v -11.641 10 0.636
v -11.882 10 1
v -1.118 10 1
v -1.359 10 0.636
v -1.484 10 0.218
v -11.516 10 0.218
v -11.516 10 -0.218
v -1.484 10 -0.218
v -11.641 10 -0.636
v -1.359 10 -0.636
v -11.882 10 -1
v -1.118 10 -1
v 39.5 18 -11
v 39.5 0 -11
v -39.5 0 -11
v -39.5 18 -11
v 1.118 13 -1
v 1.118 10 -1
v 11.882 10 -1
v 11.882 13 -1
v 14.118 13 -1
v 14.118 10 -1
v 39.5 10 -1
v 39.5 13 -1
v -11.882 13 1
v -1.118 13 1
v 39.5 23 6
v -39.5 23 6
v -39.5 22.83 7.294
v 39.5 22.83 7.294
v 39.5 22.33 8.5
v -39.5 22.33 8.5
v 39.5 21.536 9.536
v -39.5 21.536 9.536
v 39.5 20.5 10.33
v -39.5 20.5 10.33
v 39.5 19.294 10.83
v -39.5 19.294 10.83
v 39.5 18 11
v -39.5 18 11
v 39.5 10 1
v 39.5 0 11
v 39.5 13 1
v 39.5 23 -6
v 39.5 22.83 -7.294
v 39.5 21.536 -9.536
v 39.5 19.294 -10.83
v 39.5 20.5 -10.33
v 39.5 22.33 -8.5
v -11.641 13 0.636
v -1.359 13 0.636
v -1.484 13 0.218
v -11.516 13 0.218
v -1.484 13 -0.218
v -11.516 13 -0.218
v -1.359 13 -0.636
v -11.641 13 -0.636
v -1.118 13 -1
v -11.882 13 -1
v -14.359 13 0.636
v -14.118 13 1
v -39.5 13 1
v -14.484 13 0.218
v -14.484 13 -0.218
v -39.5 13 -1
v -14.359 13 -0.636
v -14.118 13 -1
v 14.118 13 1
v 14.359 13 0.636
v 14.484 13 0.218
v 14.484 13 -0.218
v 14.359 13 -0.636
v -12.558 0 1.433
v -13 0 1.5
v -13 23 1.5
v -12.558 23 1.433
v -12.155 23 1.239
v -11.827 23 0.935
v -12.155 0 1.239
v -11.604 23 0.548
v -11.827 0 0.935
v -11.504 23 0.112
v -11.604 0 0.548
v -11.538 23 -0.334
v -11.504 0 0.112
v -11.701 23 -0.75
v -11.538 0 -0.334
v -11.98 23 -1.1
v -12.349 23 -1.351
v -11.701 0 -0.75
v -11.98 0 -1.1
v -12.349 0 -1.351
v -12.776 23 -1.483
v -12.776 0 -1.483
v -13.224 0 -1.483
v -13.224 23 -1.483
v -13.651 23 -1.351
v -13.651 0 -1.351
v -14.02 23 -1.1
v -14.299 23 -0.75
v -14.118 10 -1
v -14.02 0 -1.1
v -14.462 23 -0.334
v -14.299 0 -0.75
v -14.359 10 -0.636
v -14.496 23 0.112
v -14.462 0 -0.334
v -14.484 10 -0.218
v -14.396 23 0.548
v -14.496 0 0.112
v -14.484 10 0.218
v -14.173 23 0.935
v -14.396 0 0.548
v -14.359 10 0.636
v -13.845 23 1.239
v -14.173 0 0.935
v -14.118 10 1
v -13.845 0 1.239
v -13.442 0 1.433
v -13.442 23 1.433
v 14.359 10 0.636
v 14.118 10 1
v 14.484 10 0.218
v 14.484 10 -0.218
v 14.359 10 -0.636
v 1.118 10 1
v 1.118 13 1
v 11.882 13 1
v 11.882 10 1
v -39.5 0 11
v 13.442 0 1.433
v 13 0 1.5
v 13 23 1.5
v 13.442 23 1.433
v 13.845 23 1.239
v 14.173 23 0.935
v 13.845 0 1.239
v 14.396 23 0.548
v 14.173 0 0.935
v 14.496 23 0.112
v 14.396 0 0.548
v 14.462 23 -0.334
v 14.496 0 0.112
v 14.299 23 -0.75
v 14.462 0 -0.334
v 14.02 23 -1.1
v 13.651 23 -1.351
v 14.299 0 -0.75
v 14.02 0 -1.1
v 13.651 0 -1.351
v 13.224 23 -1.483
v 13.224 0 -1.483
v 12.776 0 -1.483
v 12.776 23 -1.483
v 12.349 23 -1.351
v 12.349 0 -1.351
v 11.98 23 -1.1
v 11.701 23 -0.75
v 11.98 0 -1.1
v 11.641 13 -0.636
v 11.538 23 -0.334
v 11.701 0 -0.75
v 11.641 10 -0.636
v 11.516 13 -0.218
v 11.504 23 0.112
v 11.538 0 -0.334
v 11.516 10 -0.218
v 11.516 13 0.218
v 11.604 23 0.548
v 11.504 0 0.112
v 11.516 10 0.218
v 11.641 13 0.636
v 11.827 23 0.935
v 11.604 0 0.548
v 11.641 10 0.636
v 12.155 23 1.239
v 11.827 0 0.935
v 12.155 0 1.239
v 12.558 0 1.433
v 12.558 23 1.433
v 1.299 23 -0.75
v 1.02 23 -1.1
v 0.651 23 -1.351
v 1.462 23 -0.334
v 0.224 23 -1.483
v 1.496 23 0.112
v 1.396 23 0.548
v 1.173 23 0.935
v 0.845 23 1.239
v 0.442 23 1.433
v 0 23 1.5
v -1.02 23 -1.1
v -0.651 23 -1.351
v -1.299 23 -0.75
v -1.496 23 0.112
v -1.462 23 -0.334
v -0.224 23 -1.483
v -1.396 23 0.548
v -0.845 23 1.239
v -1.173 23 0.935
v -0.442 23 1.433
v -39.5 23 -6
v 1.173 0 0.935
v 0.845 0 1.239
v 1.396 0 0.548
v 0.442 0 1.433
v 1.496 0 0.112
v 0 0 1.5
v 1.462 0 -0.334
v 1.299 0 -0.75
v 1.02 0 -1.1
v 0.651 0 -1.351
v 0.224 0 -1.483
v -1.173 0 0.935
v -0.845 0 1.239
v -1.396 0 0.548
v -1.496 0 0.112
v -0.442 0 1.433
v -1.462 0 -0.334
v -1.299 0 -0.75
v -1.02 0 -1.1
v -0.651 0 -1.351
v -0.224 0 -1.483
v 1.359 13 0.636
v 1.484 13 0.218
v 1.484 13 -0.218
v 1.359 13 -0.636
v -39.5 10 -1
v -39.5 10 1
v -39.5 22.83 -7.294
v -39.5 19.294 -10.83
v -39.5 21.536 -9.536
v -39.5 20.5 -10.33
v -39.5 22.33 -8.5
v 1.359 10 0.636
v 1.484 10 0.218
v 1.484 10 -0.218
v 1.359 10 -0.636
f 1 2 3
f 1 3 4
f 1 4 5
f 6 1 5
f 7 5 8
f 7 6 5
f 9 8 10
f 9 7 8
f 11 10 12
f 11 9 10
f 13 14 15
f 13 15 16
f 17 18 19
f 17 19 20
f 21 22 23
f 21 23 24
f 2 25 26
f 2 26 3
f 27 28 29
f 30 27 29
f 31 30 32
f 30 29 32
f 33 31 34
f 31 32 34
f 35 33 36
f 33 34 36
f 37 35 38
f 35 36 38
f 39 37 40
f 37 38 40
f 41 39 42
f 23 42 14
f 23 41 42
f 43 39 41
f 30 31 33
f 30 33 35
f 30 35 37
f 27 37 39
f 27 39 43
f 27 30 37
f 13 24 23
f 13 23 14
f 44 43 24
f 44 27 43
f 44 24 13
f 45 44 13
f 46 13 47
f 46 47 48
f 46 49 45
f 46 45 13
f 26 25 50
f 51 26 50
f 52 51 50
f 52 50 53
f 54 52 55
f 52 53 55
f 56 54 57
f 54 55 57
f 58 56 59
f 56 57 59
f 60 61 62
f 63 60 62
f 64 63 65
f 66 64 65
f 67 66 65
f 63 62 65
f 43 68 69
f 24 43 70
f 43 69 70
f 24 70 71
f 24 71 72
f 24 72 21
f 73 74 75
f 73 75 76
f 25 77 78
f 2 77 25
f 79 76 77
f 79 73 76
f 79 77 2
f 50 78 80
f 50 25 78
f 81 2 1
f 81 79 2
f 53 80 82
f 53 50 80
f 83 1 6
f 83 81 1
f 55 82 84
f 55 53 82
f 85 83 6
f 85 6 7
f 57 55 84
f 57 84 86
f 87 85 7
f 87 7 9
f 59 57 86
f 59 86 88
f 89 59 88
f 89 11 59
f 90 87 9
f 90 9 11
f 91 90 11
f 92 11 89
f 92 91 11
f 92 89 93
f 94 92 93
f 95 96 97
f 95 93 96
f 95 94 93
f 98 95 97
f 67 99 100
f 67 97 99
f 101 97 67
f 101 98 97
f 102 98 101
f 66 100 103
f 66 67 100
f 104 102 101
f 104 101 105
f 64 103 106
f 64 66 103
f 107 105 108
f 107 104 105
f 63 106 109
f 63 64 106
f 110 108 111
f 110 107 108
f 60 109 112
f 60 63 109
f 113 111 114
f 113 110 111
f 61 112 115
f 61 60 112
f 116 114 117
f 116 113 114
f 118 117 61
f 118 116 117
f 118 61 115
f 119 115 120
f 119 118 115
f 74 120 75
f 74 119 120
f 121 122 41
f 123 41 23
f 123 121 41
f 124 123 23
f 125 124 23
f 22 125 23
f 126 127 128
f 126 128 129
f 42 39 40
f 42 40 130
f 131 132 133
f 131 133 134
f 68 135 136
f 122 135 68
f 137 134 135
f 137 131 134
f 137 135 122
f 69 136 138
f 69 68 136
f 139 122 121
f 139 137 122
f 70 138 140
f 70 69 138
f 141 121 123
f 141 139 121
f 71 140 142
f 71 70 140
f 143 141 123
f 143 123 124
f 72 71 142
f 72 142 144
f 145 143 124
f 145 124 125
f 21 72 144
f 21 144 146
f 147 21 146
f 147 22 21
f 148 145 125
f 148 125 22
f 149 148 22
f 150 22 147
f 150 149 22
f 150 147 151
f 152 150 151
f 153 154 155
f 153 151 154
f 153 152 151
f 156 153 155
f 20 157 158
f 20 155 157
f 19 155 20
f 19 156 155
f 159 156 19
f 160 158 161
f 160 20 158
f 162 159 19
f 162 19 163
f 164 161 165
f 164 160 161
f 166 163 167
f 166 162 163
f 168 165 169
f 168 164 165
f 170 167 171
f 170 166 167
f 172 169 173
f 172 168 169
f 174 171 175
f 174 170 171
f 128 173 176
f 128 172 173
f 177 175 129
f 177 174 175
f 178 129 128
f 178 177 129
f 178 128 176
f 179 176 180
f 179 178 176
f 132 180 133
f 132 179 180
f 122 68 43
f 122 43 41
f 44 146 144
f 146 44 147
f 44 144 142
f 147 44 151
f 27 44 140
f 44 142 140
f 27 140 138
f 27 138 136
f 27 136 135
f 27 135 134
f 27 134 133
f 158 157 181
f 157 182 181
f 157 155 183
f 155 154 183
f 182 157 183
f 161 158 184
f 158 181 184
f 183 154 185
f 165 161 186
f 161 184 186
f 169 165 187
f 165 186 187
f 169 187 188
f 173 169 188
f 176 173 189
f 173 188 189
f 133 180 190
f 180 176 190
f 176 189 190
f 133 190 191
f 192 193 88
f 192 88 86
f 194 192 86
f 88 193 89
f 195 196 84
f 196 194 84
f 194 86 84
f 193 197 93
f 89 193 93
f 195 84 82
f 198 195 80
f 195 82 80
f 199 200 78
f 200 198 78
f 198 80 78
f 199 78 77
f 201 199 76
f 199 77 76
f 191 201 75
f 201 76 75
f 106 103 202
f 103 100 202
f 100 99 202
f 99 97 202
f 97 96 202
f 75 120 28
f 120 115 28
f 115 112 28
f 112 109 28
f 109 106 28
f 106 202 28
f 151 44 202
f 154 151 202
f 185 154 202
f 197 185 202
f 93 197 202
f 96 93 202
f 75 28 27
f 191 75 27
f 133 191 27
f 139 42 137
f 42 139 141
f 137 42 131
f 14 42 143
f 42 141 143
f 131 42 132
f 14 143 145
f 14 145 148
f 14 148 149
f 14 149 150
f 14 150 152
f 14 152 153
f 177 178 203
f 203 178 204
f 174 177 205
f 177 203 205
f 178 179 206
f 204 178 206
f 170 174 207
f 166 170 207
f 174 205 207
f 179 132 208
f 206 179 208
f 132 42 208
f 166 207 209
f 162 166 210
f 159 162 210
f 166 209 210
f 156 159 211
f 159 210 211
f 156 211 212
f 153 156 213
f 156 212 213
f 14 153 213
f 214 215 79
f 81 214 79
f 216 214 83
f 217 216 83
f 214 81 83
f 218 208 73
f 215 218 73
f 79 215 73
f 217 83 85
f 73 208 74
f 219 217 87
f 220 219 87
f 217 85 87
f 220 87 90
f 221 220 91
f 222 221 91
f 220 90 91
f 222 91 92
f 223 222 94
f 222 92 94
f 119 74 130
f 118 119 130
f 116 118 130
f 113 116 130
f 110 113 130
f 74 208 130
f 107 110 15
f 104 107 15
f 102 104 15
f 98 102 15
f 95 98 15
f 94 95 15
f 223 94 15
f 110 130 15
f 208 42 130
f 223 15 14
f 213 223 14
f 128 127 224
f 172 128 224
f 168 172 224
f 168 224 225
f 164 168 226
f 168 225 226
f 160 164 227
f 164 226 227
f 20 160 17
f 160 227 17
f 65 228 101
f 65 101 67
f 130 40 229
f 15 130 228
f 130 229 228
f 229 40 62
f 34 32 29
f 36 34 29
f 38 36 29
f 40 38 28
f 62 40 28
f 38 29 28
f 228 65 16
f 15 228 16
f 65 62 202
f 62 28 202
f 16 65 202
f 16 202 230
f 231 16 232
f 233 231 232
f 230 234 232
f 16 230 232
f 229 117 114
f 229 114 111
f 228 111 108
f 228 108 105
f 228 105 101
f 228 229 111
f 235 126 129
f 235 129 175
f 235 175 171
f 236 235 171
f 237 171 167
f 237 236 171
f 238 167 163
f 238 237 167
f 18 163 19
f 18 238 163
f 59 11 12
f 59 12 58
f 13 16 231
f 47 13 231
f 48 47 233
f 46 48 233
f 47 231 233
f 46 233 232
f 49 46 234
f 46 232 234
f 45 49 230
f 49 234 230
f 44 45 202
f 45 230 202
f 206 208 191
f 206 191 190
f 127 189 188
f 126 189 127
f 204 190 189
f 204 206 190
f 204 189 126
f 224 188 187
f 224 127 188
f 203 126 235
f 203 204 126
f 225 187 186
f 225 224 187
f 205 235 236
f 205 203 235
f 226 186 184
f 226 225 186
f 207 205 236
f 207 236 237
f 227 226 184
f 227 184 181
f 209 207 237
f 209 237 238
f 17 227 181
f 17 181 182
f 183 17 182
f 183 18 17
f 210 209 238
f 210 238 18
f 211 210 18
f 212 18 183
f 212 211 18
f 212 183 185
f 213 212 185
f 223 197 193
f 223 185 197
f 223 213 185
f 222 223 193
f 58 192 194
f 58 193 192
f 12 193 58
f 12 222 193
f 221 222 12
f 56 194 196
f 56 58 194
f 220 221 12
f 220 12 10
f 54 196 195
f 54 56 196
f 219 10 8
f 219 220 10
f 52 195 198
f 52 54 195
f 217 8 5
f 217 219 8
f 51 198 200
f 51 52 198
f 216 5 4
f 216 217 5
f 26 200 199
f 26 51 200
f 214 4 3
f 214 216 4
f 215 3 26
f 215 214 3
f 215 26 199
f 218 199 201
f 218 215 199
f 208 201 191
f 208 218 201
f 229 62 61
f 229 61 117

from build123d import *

# Parameters (mm, degrees)
EXTRUS_O_FINA1_DEPTH       = 39.5
EXTRUS_O_FINA1_DEPTH_BACK  = 39.5
CORTE_EXTRUS_O3_DEPTH      = 48.013295992
CORTE_EXTRUS_O3_DEPTH_BACK = 48.013295992
ESBO_O1_R                  = 1.5


with BuildPart() as part:
    # Esboço2 → Extrusão-Fina1 (new, two sides: drawn at the far end of the back side and taken through both)
    with BuildSketch(Plane(origin=(0, 0, 0), x_dir=(0, 0, -1), z_dir=(1, 0, 0)).offset(-EXTRUS_O_FINA1_DEPTH_BACK)):
        with BuildLine():
            Line((6, 23), (0, 23))
            Line((0, 23), (-6, 23))
            ThreePointArc((-6, 23), (-9.535533906, 21.535533906), (-11, 18))
            Line((-11, 18), (-11, 0))
            Line((-11, 0), (11, 0))
            Line((11, 0), (11, 18))
            ThreePointArc((11, 18), (9.535533906, 21.535533906), (6, 23))
        make_face()
        Polygon((1, 13), (0, 13), (-1, 13), (-1, 10), (1, 10), align=None, mode=Mode.SUBTRACT)
    extrude(amount=EXTRUS_O_FINA1_DEPTH + EXTRUS_O_FINA1_DEPTH_BACK)

    # Esboço1 → Corte-extrusão3 (cut, two sides: drawn at the far end of the back side and taken through both)
    with BuildSketch(Plane(origin=(0, 0, 0), x_dir=(1, 0, 0), z_dir=(0, 1, 0)).offset(-CORTE_EXTRUS_O3_DEPTH_BACK)):
        with Locations(Location((13, 0, 0), (0, 0, 270))):
            Circle(ESBO_O1_R)
        with Locations(Location((0, 0, 0), (0, 0, 270))):
            Circle(ESBO_O1_R)
        with Locations(Location((-13, 0, 0), (0, 0, 270))):
            Circle(ESBO_O1_R)
    extrude(amount=CORTE_EXTRUS_O3_DEPTH + CORTE_EXTRUS_O3_DEPTH_BACK, mode=Mode.SUBTRACT)


solid = part.part
